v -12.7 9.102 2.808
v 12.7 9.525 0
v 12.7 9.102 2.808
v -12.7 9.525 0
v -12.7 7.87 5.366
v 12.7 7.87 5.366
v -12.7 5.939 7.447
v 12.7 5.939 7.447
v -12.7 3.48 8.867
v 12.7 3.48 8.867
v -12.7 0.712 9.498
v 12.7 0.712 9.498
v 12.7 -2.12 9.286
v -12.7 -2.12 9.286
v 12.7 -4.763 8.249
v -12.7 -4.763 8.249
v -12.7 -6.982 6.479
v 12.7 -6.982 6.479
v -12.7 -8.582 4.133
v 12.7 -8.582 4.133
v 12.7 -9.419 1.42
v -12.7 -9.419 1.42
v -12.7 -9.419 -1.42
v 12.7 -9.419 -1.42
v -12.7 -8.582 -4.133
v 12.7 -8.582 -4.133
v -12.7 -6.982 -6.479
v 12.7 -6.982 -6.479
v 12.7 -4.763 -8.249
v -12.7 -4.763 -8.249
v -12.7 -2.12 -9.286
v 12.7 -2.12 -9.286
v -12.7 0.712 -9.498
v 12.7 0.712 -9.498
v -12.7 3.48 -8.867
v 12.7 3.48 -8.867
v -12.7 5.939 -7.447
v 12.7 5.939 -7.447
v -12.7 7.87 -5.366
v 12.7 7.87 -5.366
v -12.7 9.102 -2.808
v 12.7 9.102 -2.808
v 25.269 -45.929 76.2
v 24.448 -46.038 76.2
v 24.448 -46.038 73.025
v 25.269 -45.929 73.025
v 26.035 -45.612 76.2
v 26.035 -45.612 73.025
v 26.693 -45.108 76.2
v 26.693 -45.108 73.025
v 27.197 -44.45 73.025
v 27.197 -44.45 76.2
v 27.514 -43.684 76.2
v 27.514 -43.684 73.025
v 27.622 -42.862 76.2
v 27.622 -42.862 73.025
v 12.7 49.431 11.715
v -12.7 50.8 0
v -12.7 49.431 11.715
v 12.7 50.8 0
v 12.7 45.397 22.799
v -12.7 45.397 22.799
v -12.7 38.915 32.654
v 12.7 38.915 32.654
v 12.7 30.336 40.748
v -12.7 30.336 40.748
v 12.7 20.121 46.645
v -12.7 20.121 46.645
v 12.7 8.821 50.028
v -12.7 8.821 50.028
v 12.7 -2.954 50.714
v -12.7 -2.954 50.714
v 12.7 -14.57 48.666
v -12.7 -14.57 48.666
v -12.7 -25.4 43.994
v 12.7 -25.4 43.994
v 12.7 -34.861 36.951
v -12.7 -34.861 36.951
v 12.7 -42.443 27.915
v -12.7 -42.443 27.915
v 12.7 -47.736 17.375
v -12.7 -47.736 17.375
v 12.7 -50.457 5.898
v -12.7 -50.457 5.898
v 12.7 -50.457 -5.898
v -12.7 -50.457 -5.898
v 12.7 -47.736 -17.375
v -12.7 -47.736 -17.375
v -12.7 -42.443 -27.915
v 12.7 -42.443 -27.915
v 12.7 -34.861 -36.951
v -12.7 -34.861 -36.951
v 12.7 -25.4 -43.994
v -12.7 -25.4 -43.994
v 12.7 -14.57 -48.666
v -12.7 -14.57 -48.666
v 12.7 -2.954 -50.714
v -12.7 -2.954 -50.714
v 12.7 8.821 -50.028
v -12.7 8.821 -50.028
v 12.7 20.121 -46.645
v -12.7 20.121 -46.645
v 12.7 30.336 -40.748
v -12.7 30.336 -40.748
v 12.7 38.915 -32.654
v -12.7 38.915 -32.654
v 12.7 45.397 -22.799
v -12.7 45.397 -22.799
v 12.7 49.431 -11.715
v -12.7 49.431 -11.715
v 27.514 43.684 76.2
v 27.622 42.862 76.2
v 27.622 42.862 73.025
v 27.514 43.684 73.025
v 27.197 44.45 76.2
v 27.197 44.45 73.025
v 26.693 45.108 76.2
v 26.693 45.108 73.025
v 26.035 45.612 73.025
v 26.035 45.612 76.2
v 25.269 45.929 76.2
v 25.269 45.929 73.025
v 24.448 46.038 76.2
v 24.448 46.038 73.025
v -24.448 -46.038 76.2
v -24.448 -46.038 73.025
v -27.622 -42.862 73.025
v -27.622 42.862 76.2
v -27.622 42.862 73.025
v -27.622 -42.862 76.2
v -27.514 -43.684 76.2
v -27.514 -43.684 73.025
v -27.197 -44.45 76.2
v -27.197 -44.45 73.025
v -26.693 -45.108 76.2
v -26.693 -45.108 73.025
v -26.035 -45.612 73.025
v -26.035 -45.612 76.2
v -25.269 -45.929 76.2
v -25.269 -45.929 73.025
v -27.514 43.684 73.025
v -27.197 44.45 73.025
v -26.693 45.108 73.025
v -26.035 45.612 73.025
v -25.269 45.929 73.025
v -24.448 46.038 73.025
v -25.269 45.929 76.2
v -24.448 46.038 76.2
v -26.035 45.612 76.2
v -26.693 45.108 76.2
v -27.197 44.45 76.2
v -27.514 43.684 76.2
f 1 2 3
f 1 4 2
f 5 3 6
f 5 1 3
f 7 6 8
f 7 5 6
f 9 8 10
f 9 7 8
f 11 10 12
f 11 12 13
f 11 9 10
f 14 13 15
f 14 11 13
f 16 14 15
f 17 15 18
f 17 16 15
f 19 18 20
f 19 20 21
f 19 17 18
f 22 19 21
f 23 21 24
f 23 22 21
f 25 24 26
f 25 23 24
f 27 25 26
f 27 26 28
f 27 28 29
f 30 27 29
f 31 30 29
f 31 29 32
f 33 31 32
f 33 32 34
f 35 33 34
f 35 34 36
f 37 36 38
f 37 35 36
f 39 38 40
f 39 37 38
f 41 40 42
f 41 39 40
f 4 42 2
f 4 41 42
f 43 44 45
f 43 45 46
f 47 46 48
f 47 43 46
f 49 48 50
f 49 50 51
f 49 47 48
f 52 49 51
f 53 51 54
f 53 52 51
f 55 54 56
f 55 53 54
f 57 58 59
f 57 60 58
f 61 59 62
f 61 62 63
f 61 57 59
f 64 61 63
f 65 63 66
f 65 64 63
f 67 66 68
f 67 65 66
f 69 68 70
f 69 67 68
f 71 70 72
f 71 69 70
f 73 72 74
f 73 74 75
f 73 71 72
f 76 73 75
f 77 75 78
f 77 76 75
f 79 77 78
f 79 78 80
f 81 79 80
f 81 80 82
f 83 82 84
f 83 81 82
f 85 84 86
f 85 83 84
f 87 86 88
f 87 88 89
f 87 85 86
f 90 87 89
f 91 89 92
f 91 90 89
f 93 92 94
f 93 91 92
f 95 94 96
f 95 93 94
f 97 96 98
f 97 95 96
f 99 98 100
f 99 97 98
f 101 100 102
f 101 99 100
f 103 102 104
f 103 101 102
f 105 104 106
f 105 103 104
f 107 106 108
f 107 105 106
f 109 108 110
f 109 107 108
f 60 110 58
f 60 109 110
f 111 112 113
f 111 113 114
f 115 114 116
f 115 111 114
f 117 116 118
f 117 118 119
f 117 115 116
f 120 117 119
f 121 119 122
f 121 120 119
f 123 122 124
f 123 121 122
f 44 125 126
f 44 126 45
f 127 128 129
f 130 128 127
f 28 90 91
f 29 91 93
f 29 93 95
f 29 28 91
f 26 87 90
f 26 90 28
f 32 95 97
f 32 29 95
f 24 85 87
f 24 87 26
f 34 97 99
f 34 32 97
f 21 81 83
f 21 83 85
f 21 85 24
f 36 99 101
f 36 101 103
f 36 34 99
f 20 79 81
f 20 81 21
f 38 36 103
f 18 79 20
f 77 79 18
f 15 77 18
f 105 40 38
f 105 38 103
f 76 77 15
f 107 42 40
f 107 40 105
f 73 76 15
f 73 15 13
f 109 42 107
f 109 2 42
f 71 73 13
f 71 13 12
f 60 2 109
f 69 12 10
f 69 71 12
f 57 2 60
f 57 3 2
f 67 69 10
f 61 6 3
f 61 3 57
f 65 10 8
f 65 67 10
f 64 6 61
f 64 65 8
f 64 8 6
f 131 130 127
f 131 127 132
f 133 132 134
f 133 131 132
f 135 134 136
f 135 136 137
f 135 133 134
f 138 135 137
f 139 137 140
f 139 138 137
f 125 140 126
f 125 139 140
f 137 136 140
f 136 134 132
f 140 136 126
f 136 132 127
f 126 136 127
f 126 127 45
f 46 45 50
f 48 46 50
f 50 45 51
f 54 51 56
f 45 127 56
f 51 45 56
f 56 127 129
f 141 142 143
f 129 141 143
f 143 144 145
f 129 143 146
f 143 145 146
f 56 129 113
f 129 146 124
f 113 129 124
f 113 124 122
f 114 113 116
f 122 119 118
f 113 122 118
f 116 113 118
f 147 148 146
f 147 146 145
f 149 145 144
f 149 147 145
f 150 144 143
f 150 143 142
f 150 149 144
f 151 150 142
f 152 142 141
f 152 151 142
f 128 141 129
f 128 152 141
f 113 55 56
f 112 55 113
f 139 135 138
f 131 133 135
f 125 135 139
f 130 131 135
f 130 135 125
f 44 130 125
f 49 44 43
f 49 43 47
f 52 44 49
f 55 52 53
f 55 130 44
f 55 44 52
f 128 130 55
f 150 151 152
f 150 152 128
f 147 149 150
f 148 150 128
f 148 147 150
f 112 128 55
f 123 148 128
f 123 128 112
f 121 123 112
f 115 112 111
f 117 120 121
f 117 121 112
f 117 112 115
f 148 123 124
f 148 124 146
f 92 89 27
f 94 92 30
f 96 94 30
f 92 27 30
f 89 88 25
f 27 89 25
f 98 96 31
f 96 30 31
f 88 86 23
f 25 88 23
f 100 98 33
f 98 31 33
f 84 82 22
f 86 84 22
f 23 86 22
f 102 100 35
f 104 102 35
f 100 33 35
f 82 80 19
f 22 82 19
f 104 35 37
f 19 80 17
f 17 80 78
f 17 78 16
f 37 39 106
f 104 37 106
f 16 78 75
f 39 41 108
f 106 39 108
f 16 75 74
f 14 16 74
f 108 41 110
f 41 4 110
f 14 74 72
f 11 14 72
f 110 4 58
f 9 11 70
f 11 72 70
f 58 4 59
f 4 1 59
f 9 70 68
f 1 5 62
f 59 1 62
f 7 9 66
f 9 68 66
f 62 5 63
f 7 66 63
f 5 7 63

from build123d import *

# Parameters (mm, degrees)
F0_R     = 50.8
F0_R_2   = 9.525
F1_DEPTH = 12.7
F4_DEPTH = 3.175


with BuildPart() as f1:
    # F0 (on Right) → F1 (new body, symmetric)
    with BuildSketch(Plane.YZ):
        Circle(F0_R)
        Circle(F0_R_2, mode=Mode.SUBTRACT)
    extrude(amount=F1_DEPTH, both=True)


with BuildPart() as f4:
    # F3 (on offset) → F4 (new body)
    with BuildSketch(Plane.XY.offset(76.2)):
        with BuildLine():
            ThreePointArc((27.6225, 42.8625), (26.692564, 45.107564), (24.4475, 46.0375))
            Line((24.4475, 46.0375), (-24.4475, 46.0375))
            ThreePointArc((-24.4475, 46.0375), (-26.692564, 45.107564), (-27.6225, 42.8625))
            Line((-27.6225, 42.8625), (-27.6225, -42.8625))
            ThreePointArc((-27.6225, -42.8625), (-26.692564, -45.107564), (-24.4475, -46.0375))
            Line((-24.4475, -46.0375), (24.4475, -46.0375))
            ThreePointArc((24.4475, -46.0375), (26.692564, -45.107564), (27.6225, -42.8625))
            Line((27.6225, -42.8625), (27.6225, 42.8625))
        make_face()
    extrude(amount=-F4_DEPTH)


solid = Compound([f1.part, f4.part])
